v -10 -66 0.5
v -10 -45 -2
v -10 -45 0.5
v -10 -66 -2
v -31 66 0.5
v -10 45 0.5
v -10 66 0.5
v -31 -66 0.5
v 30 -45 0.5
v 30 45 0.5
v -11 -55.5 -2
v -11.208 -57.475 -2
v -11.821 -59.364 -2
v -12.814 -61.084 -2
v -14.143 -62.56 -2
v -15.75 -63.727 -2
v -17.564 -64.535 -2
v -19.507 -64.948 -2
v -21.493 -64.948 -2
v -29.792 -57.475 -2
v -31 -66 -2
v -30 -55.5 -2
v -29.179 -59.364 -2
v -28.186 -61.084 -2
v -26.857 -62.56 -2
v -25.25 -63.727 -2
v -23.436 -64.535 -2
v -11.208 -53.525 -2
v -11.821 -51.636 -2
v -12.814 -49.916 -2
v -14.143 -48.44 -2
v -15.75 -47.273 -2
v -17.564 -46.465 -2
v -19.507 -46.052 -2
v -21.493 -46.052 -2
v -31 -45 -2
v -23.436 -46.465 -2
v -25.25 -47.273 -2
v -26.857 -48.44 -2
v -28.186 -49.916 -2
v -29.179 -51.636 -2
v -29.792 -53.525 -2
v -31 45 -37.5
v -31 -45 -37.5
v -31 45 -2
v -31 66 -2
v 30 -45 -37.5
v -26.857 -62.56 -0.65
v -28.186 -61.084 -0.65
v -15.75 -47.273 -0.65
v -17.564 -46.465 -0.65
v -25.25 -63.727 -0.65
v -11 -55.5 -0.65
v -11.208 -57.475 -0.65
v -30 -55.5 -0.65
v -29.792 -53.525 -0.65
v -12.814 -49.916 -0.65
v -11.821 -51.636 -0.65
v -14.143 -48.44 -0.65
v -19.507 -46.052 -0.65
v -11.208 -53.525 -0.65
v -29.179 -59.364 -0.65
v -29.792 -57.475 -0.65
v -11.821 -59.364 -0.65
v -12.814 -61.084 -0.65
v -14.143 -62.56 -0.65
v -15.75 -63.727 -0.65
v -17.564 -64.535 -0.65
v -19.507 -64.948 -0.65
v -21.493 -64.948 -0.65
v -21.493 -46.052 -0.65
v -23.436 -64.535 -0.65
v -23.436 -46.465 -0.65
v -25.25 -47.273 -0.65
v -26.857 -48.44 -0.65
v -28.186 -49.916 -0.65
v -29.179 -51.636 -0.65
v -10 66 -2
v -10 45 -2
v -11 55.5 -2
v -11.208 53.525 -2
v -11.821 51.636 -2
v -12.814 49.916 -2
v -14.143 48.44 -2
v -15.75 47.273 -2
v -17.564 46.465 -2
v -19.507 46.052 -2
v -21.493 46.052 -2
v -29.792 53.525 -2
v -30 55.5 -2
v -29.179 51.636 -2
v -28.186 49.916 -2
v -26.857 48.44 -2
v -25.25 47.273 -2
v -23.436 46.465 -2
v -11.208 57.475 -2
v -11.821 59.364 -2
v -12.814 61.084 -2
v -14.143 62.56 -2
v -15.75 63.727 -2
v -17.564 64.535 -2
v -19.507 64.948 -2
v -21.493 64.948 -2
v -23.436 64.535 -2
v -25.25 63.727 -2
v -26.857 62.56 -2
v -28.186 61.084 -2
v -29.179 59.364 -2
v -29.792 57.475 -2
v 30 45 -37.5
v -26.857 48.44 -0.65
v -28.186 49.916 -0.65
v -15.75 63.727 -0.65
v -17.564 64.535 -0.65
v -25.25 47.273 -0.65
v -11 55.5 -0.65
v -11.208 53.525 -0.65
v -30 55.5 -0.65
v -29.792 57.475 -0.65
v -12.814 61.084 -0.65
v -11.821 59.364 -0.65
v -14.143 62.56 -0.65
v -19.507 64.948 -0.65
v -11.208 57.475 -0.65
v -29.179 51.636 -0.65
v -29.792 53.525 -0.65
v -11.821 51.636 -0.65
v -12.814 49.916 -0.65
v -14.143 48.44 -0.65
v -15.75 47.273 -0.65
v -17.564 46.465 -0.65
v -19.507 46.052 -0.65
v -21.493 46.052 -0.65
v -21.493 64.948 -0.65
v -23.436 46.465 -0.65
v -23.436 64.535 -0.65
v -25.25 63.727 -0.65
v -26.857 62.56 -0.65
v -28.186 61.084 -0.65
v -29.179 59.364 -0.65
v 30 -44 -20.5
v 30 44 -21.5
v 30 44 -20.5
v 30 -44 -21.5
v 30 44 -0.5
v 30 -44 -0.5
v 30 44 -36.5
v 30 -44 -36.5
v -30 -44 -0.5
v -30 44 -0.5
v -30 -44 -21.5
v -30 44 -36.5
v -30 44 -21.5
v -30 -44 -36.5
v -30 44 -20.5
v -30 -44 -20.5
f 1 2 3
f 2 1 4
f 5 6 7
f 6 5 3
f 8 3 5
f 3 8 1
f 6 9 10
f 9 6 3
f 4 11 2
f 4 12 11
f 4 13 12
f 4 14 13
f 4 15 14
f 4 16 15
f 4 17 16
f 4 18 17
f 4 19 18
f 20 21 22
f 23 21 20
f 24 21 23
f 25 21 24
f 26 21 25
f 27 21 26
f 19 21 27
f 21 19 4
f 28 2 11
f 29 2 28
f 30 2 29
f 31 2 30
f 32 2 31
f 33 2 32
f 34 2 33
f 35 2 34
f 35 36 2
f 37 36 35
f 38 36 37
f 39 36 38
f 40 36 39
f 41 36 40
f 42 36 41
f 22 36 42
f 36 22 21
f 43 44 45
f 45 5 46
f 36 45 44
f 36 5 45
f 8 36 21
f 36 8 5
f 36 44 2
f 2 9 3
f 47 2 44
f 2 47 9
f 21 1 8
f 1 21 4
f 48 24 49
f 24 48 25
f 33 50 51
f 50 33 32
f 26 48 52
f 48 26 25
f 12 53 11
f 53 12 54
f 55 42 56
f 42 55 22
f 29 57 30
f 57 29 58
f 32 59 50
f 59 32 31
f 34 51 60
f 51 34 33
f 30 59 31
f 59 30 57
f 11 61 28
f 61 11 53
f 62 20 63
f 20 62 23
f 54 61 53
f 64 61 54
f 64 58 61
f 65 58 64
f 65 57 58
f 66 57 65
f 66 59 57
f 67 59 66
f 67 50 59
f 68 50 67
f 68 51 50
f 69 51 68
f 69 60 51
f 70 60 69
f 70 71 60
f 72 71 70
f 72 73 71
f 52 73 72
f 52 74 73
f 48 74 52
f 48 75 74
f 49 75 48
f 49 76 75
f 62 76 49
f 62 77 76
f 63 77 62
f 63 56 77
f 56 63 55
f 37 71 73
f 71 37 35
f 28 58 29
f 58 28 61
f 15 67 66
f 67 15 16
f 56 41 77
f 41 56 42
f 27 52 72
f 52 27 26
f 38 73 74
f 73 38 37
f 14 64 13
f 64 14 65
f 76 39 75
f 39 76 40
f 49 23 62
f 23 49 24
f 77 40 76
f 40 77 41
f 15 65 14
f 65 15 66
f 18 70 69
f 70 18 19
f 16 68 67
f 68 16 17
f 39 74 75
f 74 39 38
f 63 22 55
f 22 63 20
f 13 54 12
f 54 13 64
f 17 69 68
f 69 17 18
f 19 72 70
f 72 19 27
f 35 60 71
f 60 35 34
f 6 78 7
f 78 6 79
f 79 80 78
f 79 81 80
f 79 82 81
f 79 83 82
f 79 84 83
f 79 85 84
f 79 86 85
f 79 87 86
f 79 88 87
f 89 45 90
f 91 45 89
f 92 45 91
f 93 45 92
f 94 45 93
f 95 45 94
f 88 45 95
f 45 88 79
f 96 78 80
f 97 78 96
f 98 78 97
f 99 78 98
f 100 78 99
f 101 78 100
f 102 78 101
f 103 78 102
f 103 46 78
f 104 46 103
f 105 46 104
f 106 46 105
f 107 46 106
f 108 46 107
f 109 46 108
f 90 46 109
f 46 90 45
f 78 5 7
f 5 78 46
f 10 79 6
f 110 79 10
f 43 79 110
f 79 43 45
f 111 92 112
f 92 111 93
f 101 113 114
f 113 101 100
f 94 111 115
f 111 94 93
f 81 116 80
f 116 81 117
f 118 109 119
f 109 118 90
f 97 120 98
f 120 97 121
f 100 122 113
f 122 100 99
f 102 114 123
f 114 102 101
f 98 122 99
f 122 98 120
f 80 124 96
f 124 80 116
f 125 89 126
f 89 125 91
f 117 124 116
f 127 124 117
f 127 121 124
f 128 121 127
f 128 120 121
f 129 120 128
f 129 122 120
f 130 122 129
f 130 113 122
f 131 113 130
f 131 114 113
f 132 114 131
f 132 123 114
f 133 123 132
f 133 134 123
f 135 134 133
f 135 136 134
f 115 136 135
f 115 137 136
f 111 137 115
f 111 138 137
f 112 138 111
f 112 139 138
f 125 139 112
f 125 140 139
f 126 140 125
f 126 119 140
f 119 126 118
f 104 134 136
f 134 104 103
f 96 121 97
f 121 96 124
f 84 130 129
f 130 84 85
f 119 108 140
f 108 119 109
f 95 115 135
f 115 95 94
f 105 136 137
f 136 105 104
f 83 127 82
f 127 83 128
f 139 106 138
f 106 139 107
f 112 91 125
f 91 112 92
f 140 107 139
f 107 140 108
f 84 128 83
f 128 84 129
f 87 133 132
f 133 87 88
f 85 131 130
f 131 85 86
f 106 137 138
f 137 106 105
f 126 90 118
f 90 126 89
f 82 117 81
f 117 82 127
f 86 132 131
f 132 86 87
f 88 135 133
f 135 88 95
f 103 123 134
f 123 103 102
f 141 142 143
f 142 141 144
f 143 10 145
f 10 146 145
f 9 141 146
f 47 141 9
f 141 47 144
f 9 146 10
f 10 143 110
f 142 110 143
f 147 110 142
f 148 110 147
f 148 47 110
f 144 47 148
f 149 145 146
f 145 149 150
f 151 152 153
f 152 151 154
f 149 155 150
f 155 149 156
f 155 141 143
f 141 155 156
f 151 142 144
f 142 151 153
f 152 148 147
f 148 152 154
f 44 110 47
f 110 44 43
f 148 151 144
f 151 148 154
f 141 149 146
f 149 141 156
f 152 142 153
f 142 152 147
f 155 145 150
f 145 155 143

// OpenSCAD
drzak_na_fixy();

module drzak_na_fixy() {
color ("Blue", alpha=0.8) translate([0,0,0]) rotate([0,0,0]) cube(size=[60,90,1], center=true); //zada
color ("RoyalBlue", alpha=0.7) translate([0,0,-21]) rotate([0,0,0]) cube(size=[60,90,1], center=true); //prepazka
color ("RoyalBlue", alpha=0.6) translate([0,0,-37]) rotate([0,0,0]) cube(size=[60,90,1], center=true); //predni strana
color ("Green", alpha=0.8) translate([0,-44.5,-37/2]) rotate([0,0,0]) cube(size=[60,1,37], center=true); //L bok
color ("Green", alpha=0.8) translate([0,44.5,-37/2]) rotate([0,0,0]) cube(size=[60,1,37], center=true); //P bok
color ("Magenta", alpha=0.8) translate([-30.5,0,-37/2]) rotate([0,0,0]) cube(size=[1,90,38], center=true); //dno

color ("Gray", alpha=0.8) translate([-30+9.5,-44.5-11,-0.75]) difference(){
    cube(size=[21,21,2.5], center=true);
    translate ([0,0,-1.4]) cylinder(h=3, r=9.5, center=true);
    } //L magnet
color ("Gray", alpha=0.8) translate([-30+9.5,44.5+11,-0.75]) difference(){
    cube(size=[21,21,2.5], center=true);
    translate ([0,0,-1.4]) cylinder(h=3, r=9.5, center=true);
    } //R magnet
}
